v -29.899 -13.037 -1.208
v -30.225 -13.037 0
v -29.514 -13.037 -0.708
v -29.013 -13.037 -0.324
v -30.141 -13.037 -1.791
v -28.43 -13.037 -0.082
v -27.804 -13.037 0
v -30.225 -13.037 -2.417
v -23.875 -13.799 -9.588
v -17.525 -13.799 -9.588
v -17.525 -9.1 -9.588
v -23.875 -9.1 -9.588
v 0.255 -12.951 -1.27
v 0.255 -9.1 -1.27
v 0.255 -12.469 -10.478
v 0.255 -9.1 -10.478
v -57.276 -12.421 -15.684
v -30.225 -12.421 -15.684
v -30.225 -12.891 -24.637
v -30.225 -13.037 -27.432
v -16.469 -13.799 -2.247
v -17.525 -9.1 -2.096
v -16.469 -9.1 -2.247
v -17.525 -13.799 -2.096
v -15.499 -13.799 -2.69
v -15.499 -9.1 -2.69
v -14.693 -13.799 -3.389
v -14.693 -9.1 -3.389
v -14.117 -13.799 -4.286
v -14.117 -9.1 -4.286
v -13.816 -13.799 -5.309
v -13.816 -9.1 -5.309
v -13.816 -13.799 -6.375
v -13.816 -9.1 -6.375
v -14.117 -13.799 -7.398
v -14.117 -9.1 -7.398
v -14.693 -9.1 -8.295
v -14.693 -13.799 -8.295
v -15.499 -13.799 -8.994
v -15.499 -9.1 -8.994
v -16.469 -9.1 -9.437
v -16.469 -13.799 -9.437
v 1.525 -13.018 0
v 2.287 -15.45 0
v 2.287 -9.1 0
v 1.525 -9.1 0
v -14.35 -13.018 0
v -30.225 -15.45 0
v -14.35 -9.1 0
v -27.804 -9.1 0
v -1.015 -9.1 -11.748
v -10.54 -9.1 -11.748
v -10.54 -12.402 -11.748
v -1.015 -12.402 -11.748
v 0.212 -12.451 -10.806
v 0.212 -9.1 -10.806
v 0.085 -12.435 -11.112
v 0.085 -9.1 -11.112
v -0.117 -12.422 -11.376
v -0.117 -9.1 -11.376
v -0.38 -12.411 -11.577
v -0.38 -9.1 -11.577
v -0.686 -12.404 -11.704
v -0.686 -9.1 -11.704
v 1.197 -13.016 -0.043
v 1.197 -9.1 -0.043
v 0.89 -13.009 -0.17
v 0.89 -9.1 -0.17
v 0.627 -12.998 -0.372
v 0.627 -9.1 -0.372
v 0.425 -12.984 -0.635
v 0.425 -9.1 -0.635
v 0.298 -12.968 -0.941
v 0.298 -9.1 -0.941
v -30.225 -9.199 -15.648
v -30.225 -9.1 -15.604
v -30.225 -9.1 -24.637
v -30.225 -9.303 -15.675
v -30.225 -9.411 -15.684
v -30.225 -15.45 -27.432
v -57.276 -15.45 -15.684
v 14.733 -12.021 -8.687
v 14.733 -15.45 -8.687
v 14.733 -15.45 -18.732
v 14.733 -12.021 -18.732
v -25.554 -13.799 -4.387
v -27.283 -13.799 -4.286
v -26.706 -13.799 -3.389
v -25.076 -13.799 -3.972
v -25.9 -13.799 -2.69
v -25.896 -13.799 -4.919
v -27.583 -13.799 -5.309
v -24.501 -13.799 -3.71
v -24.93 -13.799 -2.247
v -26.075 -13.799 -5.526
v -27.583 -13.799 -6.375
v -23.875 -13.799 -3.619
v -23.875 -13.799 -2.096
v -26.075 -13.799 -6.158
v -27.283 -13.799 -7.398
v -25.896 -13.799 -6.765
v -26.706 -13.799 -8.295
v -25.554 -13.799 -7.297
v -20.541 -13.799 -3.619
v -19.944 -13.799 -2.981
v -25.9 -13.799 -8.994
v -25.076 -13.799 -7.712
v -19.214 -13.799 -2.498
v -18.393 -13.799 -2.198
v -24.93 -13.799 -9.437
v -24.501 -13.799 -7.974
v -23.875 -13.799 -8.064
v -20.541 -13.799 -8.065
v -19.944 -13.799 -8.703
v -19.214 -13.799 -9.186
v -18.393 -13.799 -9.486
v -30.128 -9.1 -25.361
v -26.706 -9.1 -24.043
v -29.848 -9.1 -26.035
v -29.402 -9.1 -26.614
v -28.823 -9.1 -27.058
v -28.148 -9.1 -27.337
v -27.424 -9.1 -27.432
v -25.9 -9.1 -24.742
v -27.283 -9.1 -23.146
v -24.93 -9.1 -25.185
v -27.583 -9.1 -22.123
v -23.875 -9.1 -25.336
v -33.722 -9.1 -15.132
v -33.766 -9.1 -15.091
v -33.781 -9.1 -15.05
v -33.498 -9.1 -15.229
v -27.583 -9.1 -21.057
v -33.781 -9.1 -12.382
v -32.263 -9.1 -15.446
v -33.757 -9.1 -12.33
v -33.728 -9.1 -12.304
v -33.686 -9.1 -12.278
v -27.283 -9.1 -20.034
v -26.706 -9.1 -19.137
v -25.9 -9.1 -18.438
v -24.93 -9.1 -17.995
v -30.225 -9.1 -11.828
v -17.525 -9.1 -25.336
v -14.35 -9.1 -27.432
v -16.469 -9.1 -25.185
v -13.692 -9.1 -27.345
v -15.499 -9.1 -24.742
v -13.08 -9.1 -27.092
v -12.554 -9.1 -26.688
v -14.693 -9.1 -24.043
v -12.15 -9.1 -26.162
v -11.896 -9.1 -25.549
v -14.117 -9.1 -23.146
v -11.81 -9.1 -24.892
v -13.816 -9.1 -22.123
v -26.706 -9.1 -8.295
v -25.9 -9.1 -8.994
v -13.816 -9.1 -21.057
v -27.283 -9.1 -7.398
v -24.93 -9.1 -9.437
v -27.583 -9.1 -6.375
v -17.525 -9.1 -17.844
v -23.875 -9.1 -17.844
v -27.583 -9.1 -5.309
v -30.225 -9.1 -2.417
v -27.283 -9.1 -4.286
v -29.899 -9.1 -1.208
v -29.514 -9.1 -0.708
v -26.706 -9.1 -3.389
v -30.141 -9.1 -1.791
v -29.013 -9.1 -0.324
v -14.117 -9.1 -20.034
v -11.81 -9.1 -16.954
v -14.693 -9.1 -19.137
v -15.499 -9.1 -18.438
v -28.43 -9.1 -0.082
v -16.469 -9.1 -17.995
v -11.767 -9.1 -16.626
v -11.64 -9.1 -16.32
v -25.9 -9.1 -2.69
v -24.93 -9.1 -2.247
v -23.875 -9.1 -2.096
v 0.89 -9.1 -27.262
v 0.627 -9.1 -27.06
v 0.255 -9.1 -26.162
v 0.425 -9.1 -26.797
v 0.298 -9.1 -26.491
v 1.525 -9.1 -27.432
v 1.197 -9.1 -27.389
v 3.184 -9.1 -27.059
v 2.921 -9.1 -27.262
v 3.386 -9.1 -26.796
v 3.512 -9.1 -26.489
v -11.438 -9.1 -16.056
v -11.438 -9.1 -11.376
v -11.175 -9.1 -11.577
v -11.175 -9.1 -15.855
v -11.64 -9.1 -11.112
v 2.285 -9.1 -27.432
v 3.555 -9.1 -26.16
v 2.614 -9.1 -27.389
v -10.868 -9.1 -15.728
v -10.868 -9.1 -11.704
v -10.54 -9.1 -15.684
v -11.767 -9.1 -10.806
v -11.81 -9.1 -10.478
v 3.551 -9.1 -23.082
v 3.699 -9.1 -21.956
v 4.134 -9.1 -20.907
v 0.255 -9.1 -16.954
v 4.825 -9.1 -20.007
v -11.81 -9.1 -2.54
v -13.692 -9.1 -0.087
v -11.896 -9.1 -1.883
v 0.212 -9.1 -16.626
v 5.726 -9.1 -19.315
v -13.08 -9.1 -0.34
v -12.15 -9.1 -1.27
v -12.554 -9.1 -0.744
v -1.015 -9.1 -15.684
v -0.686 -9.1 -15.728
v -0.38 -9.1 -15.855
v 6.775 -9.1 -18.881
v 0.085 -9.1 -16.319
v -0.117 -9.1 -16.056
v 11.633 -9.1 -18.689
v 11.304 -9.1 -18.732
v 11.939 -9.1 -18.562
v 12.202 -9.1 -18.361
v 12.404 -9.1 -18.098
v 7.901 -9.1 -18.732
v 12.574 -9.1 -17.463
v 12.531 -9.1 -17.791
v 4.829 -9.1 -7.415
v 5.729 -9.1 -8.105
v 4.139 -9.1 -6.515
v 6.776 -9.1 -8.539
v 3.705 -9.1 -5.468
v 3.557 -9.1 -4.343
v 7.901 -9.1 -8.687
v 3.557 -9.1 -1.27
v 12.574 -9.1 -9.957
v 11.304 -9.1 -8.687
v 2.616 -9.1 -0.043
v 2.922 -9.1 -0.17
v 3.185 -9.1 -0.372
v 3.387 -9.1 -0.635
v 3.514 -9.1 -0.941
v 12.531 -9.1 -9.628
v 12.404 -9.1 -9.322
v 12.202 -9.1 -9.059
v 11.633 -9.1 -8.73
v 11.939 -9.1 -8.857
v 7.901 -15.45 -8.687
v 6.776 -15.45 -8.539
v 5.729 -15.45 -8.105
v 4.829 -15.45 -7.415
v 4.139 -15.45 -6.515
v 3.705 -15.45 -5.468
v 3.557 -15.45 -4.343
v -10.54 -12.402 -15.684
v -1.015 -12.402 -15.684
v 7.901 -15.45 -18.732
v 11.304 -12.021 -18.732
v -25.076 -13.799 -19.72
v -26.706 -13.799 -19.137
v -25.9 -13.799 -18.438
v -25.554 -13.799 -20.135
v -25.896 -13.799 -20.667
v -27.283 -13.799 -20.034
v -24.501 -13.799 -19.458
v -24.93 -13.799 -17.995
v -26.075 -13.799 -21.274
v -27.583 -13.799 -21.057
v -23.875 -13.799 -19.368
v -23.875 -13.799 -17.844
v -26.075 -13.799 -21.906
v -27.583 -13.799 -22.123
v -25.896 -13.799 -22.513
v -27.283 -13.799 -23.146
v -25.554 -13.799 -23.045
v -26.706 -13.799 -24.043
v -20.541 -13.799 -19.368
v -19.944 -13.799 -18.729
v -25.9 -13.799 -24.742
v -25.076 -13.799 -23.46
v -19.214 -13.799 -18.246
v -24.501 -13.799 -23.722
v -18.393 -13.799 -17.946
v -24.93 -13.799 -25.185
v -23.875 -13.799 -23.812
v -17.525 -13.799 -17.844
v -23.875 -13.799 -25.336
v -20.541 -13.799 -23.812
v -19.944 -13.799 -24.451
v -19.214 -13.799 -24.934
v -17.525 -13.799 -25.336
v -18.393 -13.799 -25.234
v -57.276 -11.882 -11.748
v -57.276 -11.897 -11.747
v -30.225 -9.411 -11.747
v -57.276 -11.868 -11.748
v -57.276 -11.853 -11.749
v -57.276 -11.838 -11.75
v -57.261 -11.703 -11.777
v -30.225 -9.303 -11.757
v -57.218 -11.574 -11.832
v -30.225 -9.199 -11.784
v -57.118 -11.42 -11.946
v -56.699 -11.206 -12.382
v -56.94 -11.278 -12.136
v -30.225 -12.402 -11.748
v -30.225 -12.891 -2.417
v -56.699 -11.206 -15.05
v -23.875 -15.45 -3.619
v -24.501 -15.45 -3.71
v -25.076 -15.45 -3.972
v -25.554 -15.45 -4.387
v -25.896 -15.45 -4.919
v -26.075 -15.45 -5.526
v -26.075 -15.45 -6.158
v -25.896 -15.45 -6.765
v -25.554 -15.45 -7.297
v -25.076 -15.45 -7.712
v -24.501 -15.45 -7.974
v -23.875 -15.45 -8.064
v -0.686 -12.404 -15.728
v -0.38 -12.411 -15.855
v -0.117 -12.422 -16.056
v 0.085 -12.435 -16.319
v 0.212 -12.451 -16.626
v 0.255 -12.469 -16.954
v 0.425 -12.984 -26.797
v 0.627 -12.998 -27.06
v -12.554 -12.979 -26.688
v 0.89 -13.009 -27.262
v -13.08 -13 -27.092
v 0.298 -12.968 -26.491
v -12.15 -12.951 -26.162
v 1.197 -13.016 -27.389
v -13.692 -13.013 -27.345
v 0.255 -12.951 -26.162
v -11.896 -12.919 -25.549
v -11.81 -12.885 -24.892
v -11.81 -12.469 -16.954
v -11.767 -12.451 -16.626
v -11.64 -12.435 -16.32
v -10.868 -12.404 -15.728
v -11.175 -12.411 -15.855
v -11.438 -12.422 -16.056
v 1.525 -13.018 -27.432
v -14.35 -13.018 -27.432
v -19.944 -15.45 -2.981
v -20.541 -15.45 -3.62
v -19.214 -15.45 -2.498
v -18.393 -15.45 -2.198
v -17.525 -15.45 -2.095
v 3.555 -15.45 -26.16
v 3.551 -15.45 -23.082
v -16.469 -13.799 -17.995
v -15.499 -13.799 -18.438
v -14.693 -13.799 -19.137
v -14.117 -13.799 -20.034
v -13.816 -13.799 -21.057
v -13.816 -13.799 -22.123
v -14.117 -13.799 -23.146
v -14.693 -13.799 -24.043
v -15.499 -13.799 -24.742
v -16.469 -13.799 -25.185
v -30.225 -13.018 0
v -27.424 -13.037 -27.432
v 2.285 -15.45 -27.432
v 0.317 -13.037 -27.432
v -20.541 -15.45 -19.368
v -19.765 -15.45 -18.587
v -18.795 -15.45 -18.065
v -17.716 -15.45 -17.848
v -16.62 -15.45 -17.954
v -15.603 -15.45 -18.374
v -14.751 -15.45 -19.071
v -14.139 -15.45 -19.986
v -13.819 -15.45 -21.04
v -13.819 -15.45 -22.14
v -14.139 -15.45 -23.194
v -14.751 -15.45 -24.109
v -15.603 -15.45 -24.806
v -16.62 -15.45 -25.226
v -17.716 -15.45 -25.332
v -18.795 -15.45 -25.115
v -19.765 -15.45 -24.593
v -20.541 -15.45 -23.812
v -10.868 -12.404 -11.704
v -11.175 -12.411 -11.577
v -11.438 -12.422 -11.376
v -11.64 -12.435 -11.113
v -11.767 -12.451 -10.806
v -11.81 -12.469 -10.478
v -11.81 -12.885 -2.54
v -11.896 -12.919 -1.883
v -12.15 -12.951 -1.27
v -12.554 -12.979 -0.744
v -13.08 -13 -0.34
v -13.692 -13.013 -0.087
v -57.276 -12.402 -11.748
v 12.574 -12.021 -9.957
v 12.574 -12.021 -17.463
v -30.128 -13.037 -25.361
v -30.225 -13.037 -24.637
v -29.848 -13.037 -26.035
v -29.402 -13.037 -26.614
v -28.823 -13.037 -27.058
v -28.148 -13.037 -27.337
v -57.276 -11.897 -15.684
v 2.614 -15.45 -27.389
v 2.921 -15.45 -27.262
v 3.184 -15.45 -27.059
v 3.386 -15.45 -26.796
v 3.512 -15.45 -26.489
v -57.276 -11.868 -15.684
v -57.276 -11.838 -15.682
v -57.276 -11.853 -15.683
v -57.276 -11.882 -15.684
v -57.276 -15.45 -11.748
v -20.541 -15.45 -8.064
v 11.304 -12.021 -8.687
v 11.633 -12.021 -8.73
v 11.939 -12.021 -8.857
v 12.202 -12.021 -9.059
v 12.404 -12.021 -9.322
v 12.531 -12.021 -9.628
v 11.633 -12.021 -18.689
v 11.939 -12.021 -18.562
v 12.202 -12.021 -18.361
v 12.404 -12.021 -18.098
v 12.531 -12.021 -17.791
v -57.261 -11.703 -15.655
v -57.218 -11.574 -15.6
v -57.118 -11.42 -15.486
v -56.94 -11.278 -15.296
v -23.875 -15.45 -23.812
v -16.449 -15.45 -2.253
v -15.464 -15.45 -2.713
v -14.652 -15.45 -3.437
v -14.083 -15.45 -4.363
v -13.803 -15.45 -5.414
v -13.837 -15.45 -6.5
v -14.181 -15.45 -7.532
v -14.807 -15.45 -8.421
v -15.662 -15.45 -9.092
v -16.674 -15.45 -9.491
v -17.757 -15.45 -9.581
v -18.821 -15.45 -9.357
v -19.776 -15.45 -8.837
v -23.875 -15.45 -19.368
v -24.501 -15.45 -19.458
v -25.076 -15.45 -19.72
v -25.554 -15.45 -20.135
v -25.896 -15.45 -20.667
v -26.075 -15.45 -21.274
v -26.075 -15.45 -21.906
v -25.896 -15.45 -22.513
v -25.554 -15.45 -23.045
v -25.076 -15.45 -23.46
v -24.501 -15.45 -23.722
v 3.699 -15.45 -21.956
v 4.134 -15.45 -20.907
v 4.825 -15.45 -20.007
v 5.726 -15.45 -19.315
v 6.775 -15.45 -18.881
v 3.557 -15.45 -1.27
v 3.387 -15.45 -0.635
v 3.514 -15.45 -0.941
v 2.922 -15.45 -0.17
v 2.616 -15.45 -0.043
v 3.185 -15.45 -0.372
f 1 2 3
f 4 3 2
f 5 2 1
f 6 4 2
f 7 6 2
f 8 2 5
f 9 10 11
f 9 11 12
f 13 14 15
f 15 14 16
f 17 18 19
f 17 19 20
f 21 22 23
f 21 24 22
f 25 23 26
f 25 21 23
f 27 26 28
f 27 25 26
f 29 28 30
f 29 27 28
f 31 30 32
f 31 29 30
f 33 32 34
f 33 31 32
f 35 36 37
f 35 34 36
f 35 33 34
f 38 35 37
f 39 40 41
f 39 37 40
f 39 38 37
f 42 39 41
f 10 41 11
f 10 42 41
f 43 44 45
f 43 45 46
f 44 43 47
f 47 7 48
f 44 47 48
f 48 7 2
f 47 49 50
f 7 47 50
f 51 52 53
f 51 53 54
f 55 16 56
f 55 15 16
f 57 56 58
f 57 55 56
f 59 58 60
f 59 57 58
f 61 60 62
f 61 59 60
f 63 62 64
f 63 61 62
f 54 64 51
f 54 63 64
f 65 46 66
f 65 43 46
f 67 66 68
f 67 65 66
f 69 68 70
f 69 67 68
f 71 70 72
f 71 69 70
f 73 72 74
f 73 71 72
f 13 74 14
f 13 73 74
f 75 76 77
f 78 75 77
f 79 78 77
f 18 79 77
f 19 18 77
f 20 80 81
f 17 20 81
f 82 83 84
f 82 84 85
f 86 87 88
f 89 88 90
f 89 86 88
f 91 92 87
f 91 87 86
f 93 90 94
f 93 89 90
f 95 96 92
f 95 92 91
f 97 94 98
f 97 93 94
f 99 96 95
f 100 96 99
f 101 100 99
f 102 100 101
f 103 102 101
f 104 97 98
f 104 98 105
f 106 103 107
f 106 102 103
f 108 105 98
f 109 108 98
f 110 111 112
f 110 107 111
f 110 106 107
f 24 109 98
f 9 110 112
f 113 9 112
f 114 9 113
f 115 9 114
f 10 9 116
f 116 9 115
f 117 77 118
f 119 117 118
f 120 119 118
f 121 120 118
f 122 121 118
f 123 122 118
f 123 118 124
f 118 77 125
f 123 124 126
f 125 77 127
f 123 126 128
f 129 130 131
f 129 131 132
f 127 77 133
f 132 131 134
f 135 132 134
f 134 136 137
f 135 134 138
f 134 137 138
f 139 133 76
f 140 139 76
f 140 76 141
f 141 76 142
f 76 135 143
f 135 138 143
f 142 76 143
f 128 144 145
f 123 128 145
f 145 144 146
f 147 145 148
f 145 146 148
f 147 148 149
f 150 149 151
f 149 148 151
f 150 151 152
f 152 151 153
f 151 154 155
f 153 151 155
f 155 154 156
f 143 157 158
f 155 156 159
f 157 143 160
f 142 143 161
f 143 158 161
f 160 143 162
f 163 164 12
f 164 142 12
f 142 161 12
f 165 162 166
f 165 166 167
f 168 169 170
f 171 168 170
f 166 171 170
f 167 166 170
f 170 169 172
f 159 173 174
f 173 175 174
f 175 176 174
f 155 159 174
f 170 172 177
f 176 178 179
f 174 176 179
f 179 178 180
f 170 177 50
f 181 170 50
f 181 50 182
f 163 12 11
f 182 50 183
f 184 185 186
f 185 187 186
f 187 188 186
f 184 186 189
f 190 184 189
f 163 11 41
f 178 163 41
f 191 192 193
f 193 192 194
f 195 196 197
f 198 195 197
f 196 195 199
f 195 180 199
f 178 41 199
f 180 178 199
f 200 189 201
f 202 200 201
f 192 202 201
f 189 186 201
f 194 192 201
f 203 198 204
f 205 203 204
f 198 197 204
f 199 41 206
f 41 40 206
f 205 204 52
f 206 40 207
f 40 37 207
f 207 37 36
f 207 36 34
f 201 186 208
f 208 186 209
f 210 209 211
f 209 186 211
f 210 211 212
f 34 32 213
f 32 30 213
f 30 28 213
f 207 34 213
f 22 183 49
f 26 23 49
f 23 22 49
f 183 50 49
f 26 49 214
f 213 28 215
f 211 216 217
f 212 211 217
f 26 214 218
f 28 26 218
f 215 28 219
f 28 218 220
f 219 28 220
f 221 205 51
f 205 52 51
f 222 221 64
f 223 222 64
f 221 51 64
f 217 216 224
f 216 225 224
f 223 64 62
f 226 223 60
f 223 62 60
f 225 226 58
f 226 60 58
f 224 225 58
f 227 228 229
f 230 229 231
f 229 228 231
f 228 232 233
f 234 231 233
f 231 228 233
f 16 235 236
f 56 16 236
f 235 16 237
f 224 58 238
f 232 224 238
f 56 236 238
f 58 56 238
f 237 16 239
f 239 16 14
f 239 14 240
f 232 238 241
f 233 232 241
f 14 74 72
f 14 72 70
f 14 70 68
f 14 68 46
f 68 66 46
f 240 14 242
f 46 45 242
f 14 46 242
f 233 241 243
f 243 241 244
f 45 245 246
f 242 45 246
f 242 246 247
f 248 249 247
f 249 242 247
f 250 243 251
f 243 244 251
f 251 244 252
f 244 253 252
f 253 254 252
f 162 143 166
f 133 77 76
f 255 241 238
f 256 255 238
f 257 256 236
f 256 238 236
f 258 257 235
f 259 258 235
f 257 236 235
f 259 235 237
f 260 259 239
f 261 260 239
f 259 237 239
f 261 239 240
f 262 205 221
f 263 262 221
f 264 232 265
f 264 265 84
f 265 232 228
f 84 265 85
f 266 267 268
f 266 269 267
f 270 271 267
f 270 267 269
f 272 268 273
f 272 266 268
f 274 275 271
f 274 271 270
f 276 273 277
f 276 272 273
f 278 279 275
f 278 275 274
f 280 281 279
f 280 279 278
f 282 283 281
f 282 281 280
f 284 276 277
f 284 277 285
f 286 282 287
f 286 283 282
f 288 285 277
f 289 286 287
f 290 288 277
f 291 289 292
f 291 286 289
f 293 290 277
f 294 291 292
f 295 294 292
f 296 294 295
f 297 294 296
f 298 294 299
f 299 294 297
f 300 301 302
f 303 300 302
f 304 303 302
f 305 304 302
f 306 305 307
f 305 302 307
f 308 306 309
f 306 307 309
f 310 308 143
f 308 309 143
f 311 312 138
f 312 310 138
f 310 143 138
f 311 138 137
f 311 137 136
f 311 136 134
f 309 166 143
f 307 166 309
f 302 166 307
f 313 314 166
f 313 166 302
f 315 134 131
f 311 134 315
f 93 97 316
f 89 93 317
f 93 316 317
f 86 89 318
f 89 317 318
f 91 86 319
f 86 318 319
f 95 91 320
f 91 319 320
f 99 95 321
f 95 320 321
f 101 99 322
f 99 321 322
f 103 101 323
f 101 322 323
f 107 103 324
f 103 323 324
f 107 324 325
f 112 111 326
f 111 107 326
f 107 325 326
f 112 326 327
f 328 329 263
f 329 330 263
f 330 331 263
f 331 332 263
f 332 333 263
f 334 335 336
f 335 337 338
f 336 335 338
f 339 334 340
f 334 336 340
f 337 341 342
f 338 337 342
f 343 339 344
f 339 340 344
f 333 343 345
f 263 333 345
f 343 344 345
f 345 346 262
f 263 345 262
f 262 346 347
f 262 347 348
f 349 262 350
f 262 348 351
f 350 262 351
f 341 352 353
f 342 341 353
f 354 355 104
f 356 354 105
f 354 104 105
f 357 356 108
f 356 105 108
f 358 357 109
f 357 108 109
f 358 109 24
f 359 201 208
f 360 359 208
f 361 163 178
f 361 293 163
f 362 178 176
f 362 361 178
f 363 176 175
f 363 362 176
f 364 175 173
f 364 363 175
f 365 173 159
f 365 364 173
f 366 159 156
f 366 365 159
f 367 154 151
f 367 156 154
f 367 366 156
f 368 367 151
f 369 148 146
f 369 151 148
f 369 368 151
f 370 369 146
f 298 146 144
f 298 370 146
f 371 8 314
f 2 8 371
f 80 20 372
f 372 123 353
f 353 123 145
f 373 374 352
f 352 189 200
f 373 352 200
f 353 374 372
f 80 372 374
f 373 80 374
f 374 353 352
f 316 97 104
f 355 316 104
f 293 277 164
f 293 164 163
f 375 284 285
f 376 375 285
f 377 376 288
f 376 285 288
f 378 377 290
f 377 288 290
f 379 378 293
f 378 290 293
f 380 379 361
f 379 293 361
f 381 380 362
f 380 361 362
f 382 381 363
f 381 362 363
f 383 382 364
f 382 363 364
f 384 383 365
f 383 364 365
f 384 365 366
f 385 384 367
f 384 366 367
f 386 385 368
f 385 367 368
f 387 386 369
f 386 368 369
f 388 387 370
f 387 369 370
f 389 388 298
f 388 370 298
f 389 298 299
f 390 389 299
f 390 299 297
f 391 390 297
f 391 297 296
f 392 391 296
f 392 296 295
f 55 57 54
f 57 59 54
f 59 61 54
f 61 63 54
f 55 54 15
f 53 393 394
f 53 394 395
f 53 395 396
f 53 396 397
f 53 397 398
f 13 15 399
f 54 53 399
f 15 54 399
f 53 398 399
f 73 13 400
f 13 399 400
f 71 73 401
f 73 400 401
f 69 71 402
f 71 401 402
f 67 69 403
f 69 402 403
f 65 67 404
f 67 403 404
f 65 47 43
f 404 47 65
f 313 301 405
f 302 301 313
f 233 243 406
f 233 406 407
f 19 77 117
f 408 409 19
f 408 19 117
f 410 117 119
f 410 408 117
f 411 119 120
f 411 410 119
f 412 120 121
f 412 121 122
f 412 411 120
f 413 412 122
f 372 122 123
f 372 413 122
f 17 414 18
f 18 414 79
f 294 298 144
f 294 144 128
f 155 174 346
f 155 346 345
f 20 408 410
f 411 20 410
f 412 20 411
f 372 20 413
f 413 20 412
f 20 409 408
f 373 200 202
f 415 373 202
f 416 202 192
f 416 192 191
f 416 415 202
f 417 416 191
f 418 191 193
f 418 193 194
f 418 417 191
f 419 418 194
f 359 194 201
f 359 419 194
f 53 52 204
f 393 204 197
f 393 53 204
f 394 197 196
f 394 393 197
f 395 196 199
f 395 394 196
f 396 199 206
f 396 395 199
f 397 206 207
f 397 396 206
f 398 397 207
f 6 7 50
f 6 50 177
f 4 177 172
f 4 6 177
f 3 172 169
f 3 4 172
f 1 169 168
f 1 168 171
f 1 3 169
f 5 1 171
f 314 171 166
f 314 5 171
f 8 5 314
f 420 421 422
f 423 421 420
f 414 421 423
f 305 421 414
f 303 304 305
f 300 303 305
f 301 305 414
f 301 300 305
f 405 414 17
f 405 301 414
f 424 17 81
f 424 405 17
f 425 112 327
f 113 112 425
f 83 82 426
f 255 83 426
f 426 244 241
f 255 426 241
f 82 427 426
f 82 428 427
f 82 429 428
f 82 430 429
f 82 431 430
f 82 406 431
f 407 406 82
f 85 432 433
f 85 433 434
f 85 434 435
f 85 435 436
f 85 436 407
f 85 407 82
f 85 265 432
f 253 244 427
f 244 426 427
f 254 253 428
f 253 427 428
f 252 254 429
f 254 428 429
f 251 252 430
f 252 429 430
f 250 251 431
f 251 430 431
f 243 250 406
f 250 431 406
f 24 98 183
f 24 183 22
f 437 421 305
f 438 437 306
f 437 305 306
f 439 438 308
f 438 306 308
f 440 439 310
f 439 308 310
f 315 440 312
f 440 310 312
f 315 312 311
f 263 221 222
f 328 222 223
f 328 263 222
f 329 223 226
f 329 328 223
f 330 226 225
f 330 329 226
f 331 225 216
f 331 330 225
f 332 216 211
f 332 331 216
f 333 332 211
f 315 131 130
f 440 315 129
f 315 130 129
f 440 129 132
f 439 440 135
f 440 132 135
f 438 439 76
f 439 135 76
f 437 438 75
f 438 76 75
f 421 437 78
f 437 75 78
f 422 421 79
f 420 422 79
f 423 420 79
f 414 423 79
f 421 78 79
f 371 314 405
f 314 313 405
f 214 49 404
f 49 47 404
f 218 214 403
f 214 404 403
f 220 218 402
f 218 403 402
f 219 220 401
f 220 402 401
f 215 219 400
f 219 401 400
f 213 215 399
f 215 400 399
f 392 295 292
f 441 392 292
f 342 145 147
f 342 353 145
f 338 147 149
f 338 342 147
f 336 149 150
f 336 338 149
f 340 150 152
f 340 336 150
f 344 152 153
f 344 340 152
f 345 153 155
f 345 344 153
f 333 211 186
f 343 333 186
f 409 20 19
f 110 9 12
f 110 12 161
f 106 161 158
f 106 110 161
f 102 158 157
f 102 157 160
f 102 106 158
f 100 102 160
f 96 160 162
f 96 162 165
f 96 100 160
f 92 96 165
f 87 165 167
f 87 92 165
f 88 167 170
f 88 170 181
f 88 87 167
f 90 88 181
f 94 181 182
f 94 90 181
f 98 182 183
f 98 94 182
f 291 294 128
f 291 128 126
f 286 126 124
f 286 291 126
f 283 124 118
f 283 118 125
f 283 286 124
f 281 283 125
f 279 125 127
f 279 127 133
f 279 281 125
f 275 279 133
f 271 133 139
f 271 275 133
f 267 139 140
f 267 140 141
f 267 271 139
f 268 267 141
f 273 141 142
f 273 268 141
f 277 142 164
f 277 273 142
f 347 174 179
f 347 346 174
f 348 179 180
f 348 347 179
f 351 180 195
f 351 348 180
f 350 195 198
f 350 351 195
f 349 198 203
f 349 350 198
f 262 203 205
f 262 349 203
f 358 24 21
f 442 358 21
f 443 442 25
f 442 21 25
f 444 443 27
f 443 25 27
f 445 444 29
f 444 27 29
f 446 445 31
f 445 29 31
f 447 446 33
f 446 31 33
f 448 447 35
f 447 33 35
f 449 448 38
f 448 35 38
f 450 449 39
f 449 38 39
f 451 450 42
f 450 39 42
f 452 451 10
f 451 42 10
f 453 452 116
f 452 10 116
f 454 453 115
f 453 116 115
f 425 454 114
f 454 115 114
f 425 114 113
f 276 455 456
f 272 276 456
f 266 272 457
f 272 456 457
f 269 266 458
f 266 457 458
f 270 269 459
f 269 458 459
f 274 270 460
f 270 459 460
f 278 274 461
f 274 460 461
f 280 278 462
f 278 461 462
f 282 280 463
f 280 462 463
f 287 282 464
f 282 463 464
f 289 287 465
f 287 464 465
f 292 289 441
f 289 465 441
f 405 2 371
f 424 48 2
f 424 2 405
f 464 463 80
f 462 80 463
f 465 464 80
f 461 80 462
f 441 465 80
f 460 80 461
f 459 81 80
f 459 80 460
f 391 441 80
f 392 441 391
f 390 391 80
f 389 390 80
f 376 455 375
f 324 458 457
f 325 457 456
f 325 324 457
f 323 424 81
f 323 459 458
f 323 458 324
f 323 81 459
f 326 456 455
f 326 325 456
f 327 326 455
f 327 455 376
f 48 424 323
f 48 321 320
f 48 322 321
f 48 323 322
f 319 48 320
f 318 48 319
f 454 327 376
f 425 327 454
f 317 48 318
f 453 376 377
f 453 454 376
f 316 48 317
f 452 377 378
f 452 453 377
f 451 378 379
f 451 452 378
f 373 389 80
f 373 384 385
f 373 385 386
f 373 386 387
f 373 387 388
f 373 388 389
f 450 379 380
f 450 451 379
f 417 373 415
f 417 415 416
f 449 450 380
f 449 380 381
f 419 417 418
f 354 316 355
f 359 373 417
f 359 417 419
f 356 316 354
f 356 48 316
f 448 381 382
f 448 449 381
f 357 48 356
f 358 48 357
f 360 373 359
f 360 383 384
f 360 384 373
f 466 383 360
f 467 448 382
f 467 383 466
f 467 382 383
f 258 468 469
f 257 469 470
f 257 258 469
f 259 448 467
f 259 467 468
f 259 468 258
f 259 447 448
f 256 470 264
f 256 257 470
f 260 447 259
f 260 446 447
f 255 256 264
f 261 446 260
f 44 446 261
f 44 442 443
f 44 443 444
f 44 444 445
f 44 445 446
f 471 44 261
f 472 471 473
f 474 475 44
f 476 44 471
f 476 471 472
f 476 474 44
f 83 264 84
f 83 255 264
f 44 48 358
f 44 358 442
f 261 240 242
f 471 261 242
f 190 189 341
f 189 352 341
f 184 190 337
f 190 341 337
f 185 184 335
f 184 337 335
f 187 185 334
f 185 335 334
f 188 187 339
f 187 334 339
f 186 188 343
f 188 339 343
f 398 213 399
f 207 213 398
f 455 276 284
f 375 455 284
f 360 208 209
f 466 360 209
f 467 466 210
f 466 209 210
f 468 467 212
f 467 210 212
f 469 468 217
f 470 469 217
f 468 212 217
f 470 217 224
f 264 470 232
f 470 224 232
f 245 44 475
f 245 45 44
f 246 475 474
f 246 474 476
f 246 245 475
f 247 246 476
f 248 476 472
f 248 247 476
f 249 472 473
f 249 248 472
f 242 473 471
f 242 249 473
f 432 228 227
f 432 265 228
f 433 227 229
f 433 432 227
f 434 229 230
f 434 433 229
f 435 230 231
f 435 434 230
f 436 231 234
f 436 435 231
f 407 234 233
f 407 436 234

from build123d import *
from OCP.BRepAlgoAPI import BRepAlgoAPI_Cut
from OCP.TopTools import TopTools_ListOfShape

# Parameters (mm, degrees)
SKETCH1_W           = 72.009
SKETCH1_H           = 6.35
BOSS_EXTRUDE1_DEPTH = 27.432
CUT_EXTRUDE2_DEPTH  = 64.822827375
SKETCH4_W           = 12.065
SKETCH4_H           = 11.7475
CUT_EXTRUDE3_DEPTH  = 3.937
SKETCH5_W           = 27.051
SKETCH5_H           = 11.7475
CUT_EXTRUDE4_DEPTH  = 3.937
SKETCH6_W           = 2.159
SKETCH6_H           = 10.0457
CUT_EXTRUDE5_DEPTH  = 2.921
CHAMFER1_SIZE       = 0.635
CHAMFER1_SIZE_2     = 12.116521797
CHAMFER2_SIZE       = 12.116521797
CHAMFER2_SIZE_2     = 0.635
CHAMFER3_SIZE       = 0.615660387
CHAMFER3_SIZE_2     = 11.7475
CUT_EXTRUDE8_DEPTH  = 64.822827375
CUT_EXTRUDE10_DEPTH = 62.361435951
FILLET1_R           = 2.54
FILLET2_R           = 2.54
FILLET5_R           = 1.27
FILLET6_R           = 1.27
FILLET10_R          = 1.27
CUT_EXTRUDE11_START = -3.937
CUT_EXTRUDE11_DEPTH = 4.937
SKETCH17_R          = 2.2225
CUT_EXTRUDE12_DEPTH = 64.82283009
CUT_EXTRUDE13_START = -4.699
SKETCH18_R          = 3.7465
SKETCH18_R_2        = 2.2225
CUT_EXTRUDE13_DEPTH = 4.699
SKETCH19_R          = 3.7465
CUT_EXTRUDE14_DEPTH = 64.679759278
SKETCH20_W          = 4.845296959
SKETCH20_H          = 4.445
CUT_EXTRUDE15_DEPTH = 64.679759278
FILLET12_R          = 0.635


with BuildPart() as part:
    # Sketch1 → Boss-Extrude1 (new body)
    with BuildSketch(Plane.XY):
        with Locations((-21.271290436, -12.275116881)):
            Rectangle(SKETCH1_W, SKETCH1_H)
    extrude(amount=-BOSS_EXTRUDE1_DEPTH)

    # Sketch3 → Cut-Extrude2 (cut, through all)
    with BuildSketch(Plane(origin=(0, -9.100116881, 0), x_dir=(1, 0, 0), z_dir=(0, 1, 0))):
        with BuildLine():
            ThreePointArc((3.550859564, 23.08225), (4.824871842, 20.006512279), (7.900609564, 18.7325))
            Line((7.900609564, 18.7325), (14.733209564, 18.7325))
            Line((14.733209564, 18.7325), (14.733209564, 27.432))
            Line((14.733209564, 27.432), (3.557209564, 27.432))
            Line((3.557209564, 27.432), (3.550859564, 23.08225))
        make_face()
        with BuildLine():
            Line((14.733209564, 0), (14.733209564, 8.6868))
            Line((14.733209564, 8.6868), (7.900609564, 8.6868))
            ThreePointArc((7.900609564, 8.6868), (4.82936197, 7.414647593), (3.557209564, 4.3434))
            Line((3.557209564, 4.3434), (3.557209564, 0))
            Line((3.557209564, 0), (14.733209564, 0))
        make_face()
    extrude(amount=-CUT_EXTRUDE2_DEPTH, mode=Mode.SUBTRACT)

    # Sketch4 → Cut-Extrude3 (cut)
    with BuildSketch(Plane(origin=(0, -9.100116881, 0), x_dir=(1, 0, 0), z_dir=(0, 1, 0))):
        with Locations((-5.777290436, 21.55825)):
            Rectangle(SKETCH4_W, SKETCH4_H)
        with Locations((-5.777290436, 5.87375)):
            Rectangle(SKETCH4_W, SKETCH4_H)
    extrude(amount=-CUT_EXTRUDE3_DEPTH, mode=Mode.SUBTRACT)

    # Sketch5 → Cut-Extrude4 (cut)
    with BuildSketch(Plane(origin=(0, -9.100116881, 0), x_dir=(1, 0, 0), z_dir=(0, 1, 0))):
        with Locations((-43.750290436, 21.55825)):
            Rectangle(SKETCH5_W, SKETCH5_H)
        with Locations((-43.750290436, 5.87375)):
            Rectangle(SKETCH5_W, SKETCH5_H)
    extrude(amount=-CUT_EXTRUDE4_DEPTH, mode=Mode.SUBTRACT)

    # Sketch6 → Cut-Extrude5 (cut)
    with BuildSketch(Plane(origin=(0, -9.100116881, 0), x_dir=(1, 0, 0), z_dir=(0, 1, 0))):
        with Locations((13.653709564, 13.70965)):
            Rectangle(SKETCH6_W, SKETCH6_H)
    extrude(amount=-CUT_EXTRUDE5_DEPTH, mode=Mode.SUBTRACT)

    # Chamfer1
    # the kernel refuses this chamfer: 12.116521797, 0.635 mm, written as the material it adds along each edge
    with BuildSketch(Plane(origin=(-43.311150406, -13.037116881, -11.7475), x_dir=(0, 1, 0), z_dir=(1, 0, 0))) as chamfer1_piece_1_section:
        Polygon((CHAMFER1_SIZE, 0), (0, CHAMFER1_SIZE_2), (0, 0), align=None)
    chamfer1_piece_1 = extrude(amount=75.06771994, mode=Mode.PRIVATE)
    chamfer1_piece_1 = split(chamfer1_piece_1, bisect_by=Plane(origin=(-43.311150406, -13.037116881, 0), z_dir=(0, 0, -1)), keep=Keep.TOP, mode=Mode.PRIVATE)
    chamfer1_piece_1 = split(chamfer1_piece_1, bisect_by=Plane(origin=(3.557209564, -13.037116881, -11.7475), z_dir=(-1, 0, 0)), keep=Keep.TOP, mode=Mode.PRIVATE)
    add(chamfer1_piece_1)
    with BuildSketch(Plane(origin=(1.276569534, -13.037116881, -11.7475), x_dir=(0, 1, 0), z_dir=(-1, 0, 0))) as chamfer1_piece_2_section:
        Polygon((CHAMFER1_SIZE, 0), (0, -CHAMFER1_SIZE_2), (0, 0), align=None)
    chamfer1_piece_2 = extrude(amount=58.55235997, mode=Mode.PRIVATE)
    chamfer1_piece_2 = split(chamfer1_piece_2, bisect_by=Plane(origin=(1.276569534, -13.037116881, 0), z_dir=(0, 0, -1)), keep=Keep.TOP, mode=Mode.PRIVATE)
    add(chamfer1_piece_2)

    # Chamfer2
    # the kernel refuses this chamfer: 12.116521797, 0.635 mm, written as the material it adds along each edge
    with BuildSketch(Plane(origin=(-11.809790436, -13.037116881, -15.6845), x_dir=(0, 0, -1), z_dir=(1, 0, 0))) as chamfer2_piece_1_section:
        Polygon((CHAMFER2_SIZE, 0), (0, CHAMFER2_SIZE_2), (0, 0), align=None)
    chamfer2_piece_1 = extrude(amount=43.56635997, mode=Mode.PRIVATE)
    chamfer2_piece_1 = split(chamfer2_piece_1, bisect_by=Plane(origin=(-11.809790436, -13.037116881, -27.432), z_dir=(0, 0, 1)), keep=Keep.TOP, mode=Mode.PRIVATE)
    chamfer2_piece_1 = split(chamfer2_piece_1, bisect_by=Plane(origin=(3.540027216, -13.037116881, -15.662091507), z_dir=(-0.9999989344148313, 0, -0.0014598524589999236)), keep=Keep.TOP, mode=Mode.PRIVATE)
    add(chamfer2_piece_1)

    # Chamfer3
    # the kernel refuses this chamfer: 11.7475, 0.615660387 mm, written as the material it adds along each edge
    with BuildSketch(Plane(origin=(-57.275790436, -13.037116881, -15.6845), x_dir=(0, 1, 0), z_dir=(1, 0, 0))) as chamfer3_piece_1:
        Polygon((CHAMFER3_SIZE, 0), (0, -CHAMFER3_SIZE_2), (0, 0), align=None)
    extrude(amount=57.592951928)

    # Sketch14 → Cut-Extrude8 (cut, through all)
    with BuildSketch(Plane.XZ.offset(15.450116881)):
        Polygon((-30.224790436, 0), (-57.275790436, -11.7475), (-57.275790436, 0), align=None)
        Polygon((-30.224790436, -27.432), (-57.275790436, -15.6845), (-57.275790436, -27.432), align=None)
    extrude(amount=-CUT_EXTRUDE8_DEPTH, mode=Mode.SUBTRACT)

    # Sketch15 → Cut-Extrude10 (cut, through all)
    with BuildSketch(Plane.XY.offset(-11.7475)):
        Polygon((-57.275790436, -9.100116881), (-33.780790436, -9.100116881), (-57.275790436, -11.259116881), align=None)
    extrude(amount=-CUT_EXTRUDE10_DEPTH, mode=Mode.SUBTRACT)

    # Fillet1
    fillet1_edges = [part.edges().sort_by_distance(p)[0] for p in [
        (-11.809790436, -11.058947074, -27.432),
    ]]
    fillet(fillet1_edges, radius=FILLET1_R)

    # Fillet2
    fillet2_edges = [part.edges().sort_by_distance(p)[0] for p in [
        (-11.809790436, -11.058947074, 0),
    ]]
    fillet(fillet2_edges, radius=FILLET2_R)

    # Fillet5
    fillet5_edges = [part.edges().sort_by_distance(p)[0] for p in [
        (0.255209564, -11.058947074, 0),
        (0.255209564, -11.058947074, -27.432),
        (3.557209564, -12.275116881, -27.432),
        (3.557209564, -12.275116881, 0),
    ]]
    fillet(fillet5_edges, radius=FILLET5_R)

    # Fillet6
    fillet6_edges = [part.edges().sort_by_distance(p)[0] for p in [
        (12.574209564, -10.560616881, -8.6868),
        (12.574209564, -10.560616881, -18.7325),
    ]]
    fillet(fillet6_edges, radius=FILLET6_R)

    # Fillet10
    fillet10_edges = [part.edges().sort_by_distance(p)[0] for p in [
        (-11.809790436, -10.751116881, -11.7475),
        (0.255209564, -10.751116881, -11.7475),
        (0.255209564, -10.751116881, -15.6845),
        (-11.809790436, -10.751116881, -15.6845),
    ]]
    fillet(fillet10_edges, radius=FILLET10_R)


with BuildPart() as cut_extrude11_tool:
    # Cut-Extrude11: read off the stored shape, not the designer's step
    # Cut-Extrude11 outline → Cut-Extrude11 (new body)
    with BuildSketch(Plane(origin=(0, -9.100116881, 0), x_dir=(1, 0, 0), z_dir=(0, 1, 0)).offset(CUT_EXTRUDE11_START)):
        with BuildLine():
            Line((-27.423682508, 27.432006318), (-30.224790436, 27.432))
            Line((-30.224790436, 27.432), (-30.224790436, 24.636841581))
            ThreePointArc((-30.224790436, 24.636841581), (-29.402264799, 26.613681304), (-27.423682508, 27.432006318))
        make_face()
        with BuildLine():
            ThreePointArc((-27.804330441, -3.203e-06), (-29.514463685, 0.70754249), (-30.224790436, 2.416522456))
            Line((-30.224790436, 2.416522456), (-30.224790436, 0))
            Line((-30.224790436, 0), (-27.804330441, -3.203e-06))
        make_face()
    extrude(amount=CUT_EXTRUDE11_DEPTH)


with BuildPart() as part_1:
    add(part.part)

    # Cut-Extrude11: cut by cut_extrude11_tool, with a tolerance
    cut_extrude11_stock = TopTools_ListOfShape()
    cut_extrude11_stock.Append(part_1.part.wrapped)
    cut_extrude11_tools = TopTools_ListOfShape()
    cut_extrude11_tools.Append(cut_extrude11_tool.part.wrapped)
    cut_extrude11_cut = BRepAlgoAPI_Cut()
    cut_extrude11_cut.SetArguments(cut_extrude11_stock)
    cut_extrude11_cut.SetTools(cut_extrude11_tools)
    cut_extrude11_cut.SetFuzzyValue(0.00001)
    cut_extrude11_cut.Build()
    add(Compound.cast(cut_extrude11_cut.Shape()).solids(), mode=Mode.REPLACE)

    # Sketch17 → Cut-Extrude12 (cut, through all)
    with BuildSketch(Plane.XZ.offset(15.450116881)):
        with Locations(Location((-23.874790436, -5.842, 0), (0, 0, 270))):
            Circle(SKETCH17_R)
        with Locations(Location((-23.874790436, -21.59, 0), (0, 0, 270))):
            Circle(SKETCH17_R)
    extrude(amount=-CUT_EXTRUDE12_DEPTH, mode=Mode.SUBTRACT)

    # Sketch18 → Cut-Extrude13 (cut)
    # profile 1 of 16: a face of its own
    with BuildSketch(Plane(origin=(0, -9.100116881, 0), x_dir=(1, 0, 0), z_dir=(0, 1, 0)).offset(CUT_EXTRUDE13_START)):
        with Locations((-17.524790436, 21.59)):
            Circle(SKETCH18_R)
    # profile 2 of 16: a face of its own
    with BuildSketch(Plane(origin=(0, -9.100116881, 0), x_dir=(1, 0, 0), z_dir=(0, 1, 0)).offset(CUT_EXTRUDE13_START)):
        with Locations((-23.874790436, 21.59)):
            Circle(SKETCH18_R)
        with Locations(Location((-23.874790436, 21.59, 0), (0, 0, 90))):
            Circle(SKETCH18_R_2, mode=Mode.SUBTRACT)
    # profile 3 of 16: a face of its own
    with BuildSketch(Plane(origin=(0, -9.100116881, 0), x_dir=(1, 0, 0), z_dir=(0, 1, 0)).offset(CUT_EXTRUDE13_START)):
        with BuildLine():
            Line((-17.524790436, 25.3365), (-23.874790436, 25.3365))
            ThreePointArc((-23.874790436, 25.3365), (-22.060275437, 24.867773264), (-20.699790436, 23.57887839))
            ThreePointArc((-20.699790436, 23.57887839), (-19.339305435, 24.867773264), (-17.524790436, 25.3365))
        make_face()
    # profile 4 of 16: a face of its own
    with BuildSketch(Plane(origin=(0, -9.100116881, 0), x_dir=(1, 0, 0), z_dir=(0, 1, 0)).offset(CUT_EXTRUDE13_START)):
        with Locations((-17.524790436, 21.59)):
            Circle(SKETCH18_R)
    # profile 5 of 16: a face of its own
    with BuildSketch(Plane(origin=(0, -9.100116881, 0), x_dir=(1, 0, 0), z_dir=(0, 1, 0)).offset(CUT_EXTRUDE13_START)):
        with Locations((-23.874790436, 21.59)):
            Circle(SKETCH18_R)
    # profile 6 of 16: a face of its own
    with BuildSketch(Plane(origin=(0, -9.100116881, 0), x_dir=(1, 0, 0), z_dir=(0, 1, 0)).offset(CUT_EXTRUDE13_START)):
        with BuildLine():
            ThreePointArc((-20.699790436, 19.60112161), (-22.060275437, 18.312226736), (-23.874790436, 17.8435))
            Line((-23.874790436, 17.8435), (-17.524790436, 17.8435))
            ThreePointArc((-17.524790436, 17.8435), (-19.339305435, 18.312226736), (-20.699790436, 19.60112161))
        make_face()
    # profile 7 of 16: a face of its own
    with BuildSketch(Plane(origin=(0, -9.100116881, 0), x_dir=(1, 0, 0), z_dir=(0, 1, 0)).offset(CUT_EXTRUDE13_START)):
        with Locations((-23.874790436, 21.59)):
            Circle(SKETCH18_R)
    # profile 8 of 16: a face of its own
    with BuildSketch(Plane(origin=(0, -9.100116881, 0), x_dir=(1, 0, 0), z_dir=(0, 1, 0)).offset(CUT_EXTRUDE13_START)):
        with Locations((-17.524790436, 21.59)):
            Circle(SKETCH18_R)
    # profile 9 of 16: a face of its own
    with BuildSketch(Plane(origin=(0, -9.100116881, 0), x_dir=(1, 0, 0), z_dir=(0, 1, 0)).offset(CUT_EXTRUDE13_START)):
        with Locations((-17.524790436, 5.842)):
            Circle(SKETCH18_R)
    # profile 10 of 16: a face of its own
    with BuildSketch(Plane(origin=(0, -9.100116881, 0), x_dir=(1, 0, 0), z_dir=(0, 1, 0)).offset(CUT_EXTRUDE13_START)):
        with Locations((-23.874790436, 5.842)):
            Circle(SKETCH18_R)
        with Locations(Location((-23.874790436, 5.842, 0), (0, 0, 90))):
            Circle(SKETCH18_R_2, mode=Mode.SUBTRACT)
    # profile 11 of 16: a face of its own
    with BuildSketch(Plane(origin=(0, -9.100116881, 0), x_dir=(1, 0, 0), z_dir=(0, 1, 0)).offset(CUT_EXTRUDE13_START)):
        with BuildLine():
            Line((-17.524790436, 9.5885), (-23.874790436, 9.5885))
            ThreePointArc((-23.874790436, 9.5885), (-22.060275437, 9.119773264), (-20.699790436, 7.83087839))
            ThreePointArc((-20.699790436, 7.83087839), (-19.339305435, 9.119773264), (-17.524790436, 9.5885))
        make_face()
    # profile 12 of 16: a face of its own
    with BuildSketch(Plane(origin=(0, -9.100116881, 0), x_dir=(1, 0, 0), z_dir=(0, 1, 0)).offset(CUT_EXTRUDE13_START)):
        with Locations((-17.524790436, 5.842)):
            Circle(SKETCH18_R)
    # profile 13 of 16: a face of its own
    with BuildSketch(Plane(origin=(0, -9.100116881, 0), x_dir=(1, 0, 0), z_dir=(0, 1, 0)).offset(CUT_EXTRUDE13_START)):
        with Locations((-23.874790436, 5.842)):
            Circle(SKETCH18_R)
    # profile 14 of 16: a face of its own
    with BuildSketch(Plane(origin=(0, -9.100116881, 0), x_dir=(1, 0, 0), z_dir=(0, 1, 0)).offset(CUT_EXTRUDE13_START)):
        with Locations((-23.874790436, 5.842)):
            Circle(SKETCH18_R)
    # profile 15 of 16: a face of its own
    with BuildSketch(Plane(origin=(0, -9.100116881, 0), x_dir=(1, 0, 0), z_dir=(0, 1, 0)).offset(CUT_EXTRUDE13_START)):
        with Locations((-17.524790436, 5.842)):
            Circle(SKETCH18_R)
    # profile 16 of 16: a face of its own
    with BuildSketch(Plane(origin=(0, -9.100116881, 0), x_dir=(1, 0, 0), z_dir=(0, 1, 0)).offset(CUT_EXTRUDE13_START)):
        with BuildLine():
            ThreePointArc((-20.699790436, 3.85312161), (-22.060275437, 2.564226736), (-23.874790436, 2.0955))
            Line((-23.874790436, 2.0955), (-17.524790436, 2.0955))
            ThreePointArc((-17.524790436, 2.0955), (-19.339305435, 2.564226736), (-20.699790436, 3.85312161))
        make_face()
    extrude(amount=CUT_EXTRUDE13_DEPTH, mode=Mode.SUBTRACT)

    # Sketch19 → Cut-Extrude14 (cut, through all)
    with BuildSketch(Plane(origin=(0, -13.799116881, 0), x_dir=(1, 0, 0), z_dir=(0, 1, 0))):
        with BuildLine():
            Line((-20.540873326, 23.8125), (-23.874790436, 23.8125))
            ThreePointArc((-23.874790436, 23.8125), (-21.652290436, 21.59), (-23.874790436, 19.3675))
            Line((-23.874790436, 19.3675), (-20.540873326, 19.3675))
            ThreePointArc((-20.540873326, 19.3675), (-13.778290436, 21.59), (-20.540873326, 23.8125))
        make_face()
        with Locations(Location((-17.524790436, 5.842, 0), (0, 0, 270))):
            Circle(SKETCH19_R)
    extrude(amount=-CUT_EXTRUDE14_DEPTH, mode=Mode.SUBTRACT)

    # Sketch20 → Cut-Extrude15 (cut, through all)
    with BuildSketch(Plane(origin=(0, -13.799116881, 0), x_dir=(1, 0, 0), z_dir=(0, 1, 0))):
        with Locations((-21.452141957, 5.842)):
            Rectangle(SKETCH20_W, SKETCH20_H)
    extrude(amount=-CUT_EXTRUDE15_DEPTH, mode=Mode.SUBTRACT)

    # Fillet12
    # the kernel refuses this fillet: 0.635 mm, written as the material it takes off along each edge
    with BuildSketch(Plane(origin=(-57.275790436, -11.259116881, -10.299189948), x_dir=(0.9958044920127651, 0.09150635872549404, 0), z_dir=(0, 0, -1))) as fillet12_piece_1:
        with BuildLine():
            CenterArc((FILLET12_R * 0.912321292544, FILLET12_R), FILLET12_R, 185.25027273, 84.74972727)
            Line((-FILLET12_R * 0.0834831994685, FILLET12_R * 0.908493641275), (0, 0))
            Line((0, 0), (FILLET12_R * 0.912321292544, 0))
        make_face()
    extrude(amount=6.833620104, mode=Mode.SUBTRACT)
    with BuildSketch(Plane(origin=(-25.876592281, -8.373785158, -15.6845), x_dir=(0, 0, 1), z_dir=(-0.9958044920127651, -0.09150635872549373, 0))) as fillet12_piece_2_section:
        with BuildLine():
            CenterArc((FILLET12_R, -FILLET12_R), FILLET12_R, 90, 90)
            Line((0, -FILLET12_R), (0, 0))
            Line((0, 0), (FILLET12_R, 0))
        make_face()
    fillet12_piece_2 = extrude(amount=33.118988768, mode=Mode.PRIVATE)
    fillet12_piece_2 = split(fillet12_piece_2, bisect_by=Plane(origin=(-30.224790436, -8.373785158, -15.6845), z_dir=(-1, 0, 0)), keep=Keep.TOP, mode=Mode.PRIVATE)
    add(fillet12_piece_2, mode=Mode.SUBTRACT)
    with BuildSketch(Plane(origin=(-25.876592281, -8.373785158, -11.7475), x_dir=(0.09150635872549373, -0.9958044920127651, 1.3987061727561039e-14), z_dir=(-0.9958044920127651, -0.09150635872549373, 0))) as fillet12_piece_3_section:
        with BuildLine():
            CenterArc((FILLET12_R, -FILLET12_R), FILLET12_R, 90, 90)
            Line((0, -FILLET12_R), (0, 0))
            Line((0, 0), (FILLET12_R, 0))
        make_face()
    fillet12_piece_3 = extrude(amount=33.118988768, mode=Mode.PRIVATE)
    fillet12_piece_3 = split(fillet12_piece_3, bisect_by=Plane(origin=(-30.224790436, -8.373785158, -11.7475), z_dir=(-1, 0, 0)), keep=Keep.TOP, mode=Mode.PRIVATE)
    add(fillet12_piece_3, mode=Mode.SUBTRACT)


solid = part_1.part
